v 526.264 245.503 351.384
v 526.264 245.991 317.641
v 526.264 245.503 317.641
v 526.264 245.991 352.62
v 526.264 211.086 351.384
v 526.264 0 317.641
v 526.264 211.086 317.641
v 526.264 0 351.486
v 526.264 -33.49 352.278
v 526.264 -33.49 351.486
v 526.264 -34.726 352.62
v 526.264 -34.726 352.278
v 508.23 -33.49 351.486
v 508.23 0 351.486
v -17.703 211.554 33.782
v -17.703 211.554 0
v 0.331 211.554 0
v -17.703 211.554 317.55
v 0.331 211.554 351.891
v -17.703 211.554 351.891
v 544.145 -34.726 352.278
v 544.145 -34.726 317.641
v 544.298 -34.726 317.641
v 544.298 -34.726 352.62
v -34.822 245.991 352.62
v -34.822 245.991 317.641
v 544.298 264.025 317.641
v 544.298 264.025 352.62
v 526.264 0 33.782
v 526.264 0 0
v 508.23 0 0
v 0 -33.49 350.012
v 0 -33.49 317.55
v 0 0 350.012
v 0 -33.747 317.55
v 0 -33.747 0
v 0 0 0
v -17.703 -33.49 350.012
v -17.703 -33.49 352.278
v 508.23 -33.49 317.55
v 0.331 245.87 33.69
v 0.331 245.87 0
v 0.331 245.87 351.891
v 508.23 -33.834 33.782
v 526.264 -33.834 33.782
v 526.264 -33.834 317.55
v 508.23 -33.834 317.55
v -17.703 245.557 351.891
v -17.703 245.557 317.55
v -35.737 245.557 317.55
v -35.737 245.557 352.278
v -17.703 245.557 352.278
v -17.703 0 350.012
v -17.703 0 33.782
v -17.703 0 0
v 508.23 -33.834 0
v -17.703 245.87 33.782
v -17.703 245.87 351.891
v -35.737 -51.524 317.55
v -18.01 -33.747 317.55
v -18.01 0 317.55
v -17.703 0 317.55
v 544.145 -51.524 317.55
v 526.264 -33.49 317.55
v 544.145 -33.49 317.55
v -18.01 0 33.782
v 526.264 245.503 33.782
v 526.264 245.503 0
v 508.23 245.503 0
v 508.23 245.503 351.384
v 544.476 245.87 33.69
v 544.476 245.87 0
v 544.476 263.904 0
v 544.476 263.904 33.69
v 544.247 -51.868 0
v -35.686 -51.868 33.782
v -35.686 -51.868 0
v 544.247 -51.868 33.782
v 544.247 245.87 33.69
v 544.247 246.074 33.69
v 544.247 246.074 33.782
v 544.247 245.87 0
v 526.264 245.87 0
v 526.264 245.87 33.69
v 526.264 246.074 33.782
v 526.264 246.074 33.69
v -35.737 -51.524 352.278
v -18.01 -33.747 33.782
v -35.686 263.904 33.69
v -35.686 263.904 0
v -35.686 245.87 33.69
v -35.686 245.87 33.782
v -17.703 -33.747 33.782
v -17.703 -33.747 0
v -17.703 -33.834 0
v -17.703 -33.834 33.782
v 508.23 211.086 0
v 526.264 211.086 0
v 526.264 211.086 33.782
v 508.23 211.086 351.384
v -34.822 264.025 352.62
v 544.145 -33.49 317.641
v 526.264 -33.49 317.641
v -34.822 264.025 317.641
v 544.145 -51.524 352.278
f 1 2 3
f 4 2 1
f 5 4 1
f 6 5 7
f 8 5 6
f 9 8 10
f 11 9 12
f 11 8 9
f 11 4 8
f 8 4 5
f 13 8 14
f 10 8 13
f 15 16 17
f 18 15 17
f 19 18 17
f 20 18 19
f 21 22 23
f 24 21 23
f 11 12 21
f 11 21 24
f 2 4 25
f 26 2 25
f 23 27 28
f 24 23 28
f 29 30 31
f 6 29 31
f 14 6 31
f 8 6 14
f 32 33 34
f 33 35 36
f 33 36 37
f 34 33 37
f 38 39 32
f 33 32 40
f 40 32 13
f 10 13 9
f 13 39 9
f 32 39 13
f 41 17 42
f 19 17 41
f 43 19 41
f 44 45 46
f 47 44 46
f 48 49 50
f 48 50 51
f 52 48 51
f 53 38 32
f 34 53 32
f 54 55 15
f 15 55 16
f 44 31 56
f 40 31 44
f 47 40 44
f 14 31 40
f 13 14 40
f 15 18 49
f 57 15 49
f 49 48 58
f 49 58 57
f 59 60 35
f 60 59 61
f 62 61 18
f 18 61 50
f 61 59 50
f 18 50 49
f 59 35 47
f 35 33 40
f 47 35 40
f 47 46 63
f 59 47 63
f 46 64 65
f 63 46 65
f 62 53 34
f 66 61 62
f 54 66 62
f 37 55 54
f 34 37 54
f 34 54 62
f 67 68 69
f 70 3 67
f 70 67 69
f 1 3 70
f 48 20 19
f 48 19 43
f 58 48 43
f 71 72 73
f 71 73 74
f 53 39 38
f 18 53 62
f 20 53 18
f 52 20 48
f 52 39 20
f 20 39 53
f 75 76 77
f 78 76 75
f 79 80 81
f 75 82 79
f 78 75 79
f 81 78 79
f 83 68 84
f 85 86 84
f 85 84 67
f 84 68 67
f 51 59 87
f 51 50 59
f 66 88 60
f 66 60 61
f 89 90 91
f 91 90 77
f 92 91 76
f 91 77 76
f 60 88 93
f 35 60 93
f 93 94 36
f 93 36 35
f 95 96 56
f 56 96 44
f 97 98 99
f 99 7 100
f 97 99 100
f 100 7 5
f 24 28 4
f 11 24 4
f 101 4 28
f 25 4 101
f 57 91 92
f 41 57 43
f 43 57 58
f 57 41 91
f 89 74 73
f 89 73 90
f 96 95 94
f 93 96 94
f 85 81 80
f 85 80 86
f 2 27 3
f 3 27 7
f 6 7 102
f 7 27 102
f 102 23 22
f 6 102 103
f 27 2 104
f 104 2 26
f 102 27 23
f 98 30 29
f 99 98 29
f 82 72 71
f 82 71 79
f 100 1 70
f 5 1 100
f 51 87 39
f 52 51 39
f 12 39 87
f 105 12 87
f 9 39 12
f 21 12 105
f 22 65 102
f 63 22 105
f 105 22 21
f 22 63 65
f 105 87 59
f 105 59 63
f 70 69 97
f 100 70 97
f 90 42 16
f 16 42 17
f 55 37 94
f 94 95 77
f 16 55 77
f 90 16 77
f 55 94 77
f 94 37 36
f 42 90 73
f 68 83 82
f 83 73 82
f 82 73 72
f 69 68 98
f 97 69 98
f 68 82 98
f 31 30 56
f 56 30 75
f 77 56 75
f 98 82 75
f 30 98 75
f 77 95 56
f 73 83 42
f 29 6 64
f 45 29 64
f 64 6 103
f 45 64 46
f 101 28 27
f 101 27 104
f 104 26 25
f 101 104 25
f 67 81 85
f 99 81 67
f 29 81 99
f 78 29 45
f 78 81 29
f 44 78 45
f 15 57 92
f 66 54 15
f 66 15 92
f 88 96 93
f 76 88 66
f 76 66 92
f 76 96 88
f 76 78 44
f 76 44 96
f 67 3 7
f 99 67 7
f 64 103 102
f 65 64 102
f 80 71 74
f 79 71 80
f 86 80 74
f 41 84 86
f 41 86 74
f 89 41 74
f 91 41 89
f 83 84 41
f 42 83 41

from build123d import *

# Parameters (mm, degrees)
F0_W      = 18.0097855628
F0_H      = 33.7471626699
F1_DEPTH  = 350.012
F2_W      = 17.9832
F2_H      = 279.7042541206
F3_DEPTH  = 33.782
F4_W      = 579.9328
F4_H      = 33.782
F5_DEPTH  = 18.034
F6_W      = 17.9832
F6_H      = 33.782
F7_DEPTH  = 279.908
F8_W      = 580.1614
F8_H      = 33.6901992559
F9_DEPTH  = 18.034
F10_W     = 34.3154
F10_H     = 351.8910109997
F11_DEPTH = 18.034
F12_W     = 33.8344089687
F12_H     = 351.4855802059
F13_DEPTH = 18.034
F14_W     = 34.417
F14_H     = 351.3836
F15_DEPTH = 18.034
F16_W     = 280.7166390121
F16_H     = 34.9791944027
F17_DEPTH = 18.034
F18_W     = 279.0465280414
F18_H     = 34.7275435925
F19_DEPTH = 18.034
F20_W     = 579.12
F20_H     = 34.9791944027
F21_DEPTH = 18.034
F22_W     = 579.882
F22_H     = 34.7275435925
F23_DEPTH = 18.034


with BuildPart() as f1:
    # F0 (on Top) → F1 (new body)
    with BuildSketch(Plane.XY):
        with Locations((-9.0048927814, -16.8735813349)):
            Rectangle(F0_W, F0_H)
    extrude(amount=F1_DEPTH)

    # F2 (on Top) → F3 (join)
    with BuildSketch(Plane.XY):
        with Locations((-26.6942894229, 106.0177180916)):
            Rectangle(F2_W, F2_H)
    extrude(amount=F3_DEPTH)

    # F4 (on face) → F5 (join)
    with BuildSketch(Plane.XZ.offset(33.8344089687)):
        with Locations((254.2805105771, 16.891)):
            Rectangle(F4_W, F4_H)
    extrude(amount=F5_DEPTH)

    # F6 (on face) → F7 (join)
    with BuildSketch(Plane(origin=(0, -33.8344089687, 0), x_dir=(-1, 0, 0), z_dir=(0, 1, 0))):
        with Locations((-535.2553105771, 16.891)):
            Rectangle(F6_W, F6_H)
    extrude(amount=F7_DEPTH)

    # F8 (on face) → F9 (join)
    with BuildSketch(Plane(origin=(0, 245.8698451519, 0), x_dir=(-1, 0, 0), z_dir=(0, 1, 0))):
        with Locations((-254.3948105771, 16.845099628)):
            Rectangle(F8_W, F8_H)
    extrude(amount=F9_DEPTH)

    # F10 (on face) → F11 (join)
    with BuildSketch(Plane.YZ.offset(-17.7026894229)):
        with Locations((228.7121451519, 175.9455054998)):
            Rectangle(F10_W, F10_H)
    extrude(amount=F11_DEPTH)

    # F12 (on face) → F13 (join)
    with BuildSketch(Plane(origin=(526.2637105771, 0, 0), x_dir=(0, -1, 0), z_dir=(-1, 0, 0))):
        with Locations((16.9172044843, 175.742790103)):
            Rectangle(F12_W, F12_H)
    extrude(amount=F13_DEPTH)

    # F14 (on face) → F15 (join)
    with BuildSketch(Plane(origin=(526.2637105771, 0, 0), x_dir=(0, -1, 0), z_dir=(-1, 0, 0))):
        with Locations((-228.2942401447, 175.6918)):
            Rectangle(F14_W, F14_H)
    extrude(amount=F15_DEPTH)

    # F16 (on face) → F17 (join)
    with BuildSketch(Plane(origin=(526.2637105771, 0, 0), x_dir=(0, -1, 0), z_dir=(-1, 0, 0))):
        with Locations((-105.6323889643, 335.1304978132)):
            Rectangle(F16_W, F16_H)
    extrude(amount=-F17_DEPTH)

    # F18 (on face) → F19 (join)
    with BuildSketch(Plane.YZ.offset(-17.7026894229)):
        with Locations((106.0337163508, 334.9141031504)):
            Rectangle(F18_W, F18_H)
    extrude(amount=-F19_DEPTH)

    # F20 (on face) → F21 (join)
    with BuildSketch(Plane(origin=(0, 245.9907084703, 0), x_dir=(-1, 0, 0), z_dir=(0, 1, 0))):
        with Locations((-254.7377105771, 335.1304978132)):
            Rectangle(F20_W, F20_H)
    extrude(amount=F21_DEPTH)

    # F22 (on face) → F23 (join)
    with BuildSketch(Plane.XZ.offset(33.4895476699)):
        with Locations((254.2043105771, 334.9141031504)):
            Rectangle(F22_W, F22_H)
    extrude(amount=F23_DEPTH)


solid = f1.part
